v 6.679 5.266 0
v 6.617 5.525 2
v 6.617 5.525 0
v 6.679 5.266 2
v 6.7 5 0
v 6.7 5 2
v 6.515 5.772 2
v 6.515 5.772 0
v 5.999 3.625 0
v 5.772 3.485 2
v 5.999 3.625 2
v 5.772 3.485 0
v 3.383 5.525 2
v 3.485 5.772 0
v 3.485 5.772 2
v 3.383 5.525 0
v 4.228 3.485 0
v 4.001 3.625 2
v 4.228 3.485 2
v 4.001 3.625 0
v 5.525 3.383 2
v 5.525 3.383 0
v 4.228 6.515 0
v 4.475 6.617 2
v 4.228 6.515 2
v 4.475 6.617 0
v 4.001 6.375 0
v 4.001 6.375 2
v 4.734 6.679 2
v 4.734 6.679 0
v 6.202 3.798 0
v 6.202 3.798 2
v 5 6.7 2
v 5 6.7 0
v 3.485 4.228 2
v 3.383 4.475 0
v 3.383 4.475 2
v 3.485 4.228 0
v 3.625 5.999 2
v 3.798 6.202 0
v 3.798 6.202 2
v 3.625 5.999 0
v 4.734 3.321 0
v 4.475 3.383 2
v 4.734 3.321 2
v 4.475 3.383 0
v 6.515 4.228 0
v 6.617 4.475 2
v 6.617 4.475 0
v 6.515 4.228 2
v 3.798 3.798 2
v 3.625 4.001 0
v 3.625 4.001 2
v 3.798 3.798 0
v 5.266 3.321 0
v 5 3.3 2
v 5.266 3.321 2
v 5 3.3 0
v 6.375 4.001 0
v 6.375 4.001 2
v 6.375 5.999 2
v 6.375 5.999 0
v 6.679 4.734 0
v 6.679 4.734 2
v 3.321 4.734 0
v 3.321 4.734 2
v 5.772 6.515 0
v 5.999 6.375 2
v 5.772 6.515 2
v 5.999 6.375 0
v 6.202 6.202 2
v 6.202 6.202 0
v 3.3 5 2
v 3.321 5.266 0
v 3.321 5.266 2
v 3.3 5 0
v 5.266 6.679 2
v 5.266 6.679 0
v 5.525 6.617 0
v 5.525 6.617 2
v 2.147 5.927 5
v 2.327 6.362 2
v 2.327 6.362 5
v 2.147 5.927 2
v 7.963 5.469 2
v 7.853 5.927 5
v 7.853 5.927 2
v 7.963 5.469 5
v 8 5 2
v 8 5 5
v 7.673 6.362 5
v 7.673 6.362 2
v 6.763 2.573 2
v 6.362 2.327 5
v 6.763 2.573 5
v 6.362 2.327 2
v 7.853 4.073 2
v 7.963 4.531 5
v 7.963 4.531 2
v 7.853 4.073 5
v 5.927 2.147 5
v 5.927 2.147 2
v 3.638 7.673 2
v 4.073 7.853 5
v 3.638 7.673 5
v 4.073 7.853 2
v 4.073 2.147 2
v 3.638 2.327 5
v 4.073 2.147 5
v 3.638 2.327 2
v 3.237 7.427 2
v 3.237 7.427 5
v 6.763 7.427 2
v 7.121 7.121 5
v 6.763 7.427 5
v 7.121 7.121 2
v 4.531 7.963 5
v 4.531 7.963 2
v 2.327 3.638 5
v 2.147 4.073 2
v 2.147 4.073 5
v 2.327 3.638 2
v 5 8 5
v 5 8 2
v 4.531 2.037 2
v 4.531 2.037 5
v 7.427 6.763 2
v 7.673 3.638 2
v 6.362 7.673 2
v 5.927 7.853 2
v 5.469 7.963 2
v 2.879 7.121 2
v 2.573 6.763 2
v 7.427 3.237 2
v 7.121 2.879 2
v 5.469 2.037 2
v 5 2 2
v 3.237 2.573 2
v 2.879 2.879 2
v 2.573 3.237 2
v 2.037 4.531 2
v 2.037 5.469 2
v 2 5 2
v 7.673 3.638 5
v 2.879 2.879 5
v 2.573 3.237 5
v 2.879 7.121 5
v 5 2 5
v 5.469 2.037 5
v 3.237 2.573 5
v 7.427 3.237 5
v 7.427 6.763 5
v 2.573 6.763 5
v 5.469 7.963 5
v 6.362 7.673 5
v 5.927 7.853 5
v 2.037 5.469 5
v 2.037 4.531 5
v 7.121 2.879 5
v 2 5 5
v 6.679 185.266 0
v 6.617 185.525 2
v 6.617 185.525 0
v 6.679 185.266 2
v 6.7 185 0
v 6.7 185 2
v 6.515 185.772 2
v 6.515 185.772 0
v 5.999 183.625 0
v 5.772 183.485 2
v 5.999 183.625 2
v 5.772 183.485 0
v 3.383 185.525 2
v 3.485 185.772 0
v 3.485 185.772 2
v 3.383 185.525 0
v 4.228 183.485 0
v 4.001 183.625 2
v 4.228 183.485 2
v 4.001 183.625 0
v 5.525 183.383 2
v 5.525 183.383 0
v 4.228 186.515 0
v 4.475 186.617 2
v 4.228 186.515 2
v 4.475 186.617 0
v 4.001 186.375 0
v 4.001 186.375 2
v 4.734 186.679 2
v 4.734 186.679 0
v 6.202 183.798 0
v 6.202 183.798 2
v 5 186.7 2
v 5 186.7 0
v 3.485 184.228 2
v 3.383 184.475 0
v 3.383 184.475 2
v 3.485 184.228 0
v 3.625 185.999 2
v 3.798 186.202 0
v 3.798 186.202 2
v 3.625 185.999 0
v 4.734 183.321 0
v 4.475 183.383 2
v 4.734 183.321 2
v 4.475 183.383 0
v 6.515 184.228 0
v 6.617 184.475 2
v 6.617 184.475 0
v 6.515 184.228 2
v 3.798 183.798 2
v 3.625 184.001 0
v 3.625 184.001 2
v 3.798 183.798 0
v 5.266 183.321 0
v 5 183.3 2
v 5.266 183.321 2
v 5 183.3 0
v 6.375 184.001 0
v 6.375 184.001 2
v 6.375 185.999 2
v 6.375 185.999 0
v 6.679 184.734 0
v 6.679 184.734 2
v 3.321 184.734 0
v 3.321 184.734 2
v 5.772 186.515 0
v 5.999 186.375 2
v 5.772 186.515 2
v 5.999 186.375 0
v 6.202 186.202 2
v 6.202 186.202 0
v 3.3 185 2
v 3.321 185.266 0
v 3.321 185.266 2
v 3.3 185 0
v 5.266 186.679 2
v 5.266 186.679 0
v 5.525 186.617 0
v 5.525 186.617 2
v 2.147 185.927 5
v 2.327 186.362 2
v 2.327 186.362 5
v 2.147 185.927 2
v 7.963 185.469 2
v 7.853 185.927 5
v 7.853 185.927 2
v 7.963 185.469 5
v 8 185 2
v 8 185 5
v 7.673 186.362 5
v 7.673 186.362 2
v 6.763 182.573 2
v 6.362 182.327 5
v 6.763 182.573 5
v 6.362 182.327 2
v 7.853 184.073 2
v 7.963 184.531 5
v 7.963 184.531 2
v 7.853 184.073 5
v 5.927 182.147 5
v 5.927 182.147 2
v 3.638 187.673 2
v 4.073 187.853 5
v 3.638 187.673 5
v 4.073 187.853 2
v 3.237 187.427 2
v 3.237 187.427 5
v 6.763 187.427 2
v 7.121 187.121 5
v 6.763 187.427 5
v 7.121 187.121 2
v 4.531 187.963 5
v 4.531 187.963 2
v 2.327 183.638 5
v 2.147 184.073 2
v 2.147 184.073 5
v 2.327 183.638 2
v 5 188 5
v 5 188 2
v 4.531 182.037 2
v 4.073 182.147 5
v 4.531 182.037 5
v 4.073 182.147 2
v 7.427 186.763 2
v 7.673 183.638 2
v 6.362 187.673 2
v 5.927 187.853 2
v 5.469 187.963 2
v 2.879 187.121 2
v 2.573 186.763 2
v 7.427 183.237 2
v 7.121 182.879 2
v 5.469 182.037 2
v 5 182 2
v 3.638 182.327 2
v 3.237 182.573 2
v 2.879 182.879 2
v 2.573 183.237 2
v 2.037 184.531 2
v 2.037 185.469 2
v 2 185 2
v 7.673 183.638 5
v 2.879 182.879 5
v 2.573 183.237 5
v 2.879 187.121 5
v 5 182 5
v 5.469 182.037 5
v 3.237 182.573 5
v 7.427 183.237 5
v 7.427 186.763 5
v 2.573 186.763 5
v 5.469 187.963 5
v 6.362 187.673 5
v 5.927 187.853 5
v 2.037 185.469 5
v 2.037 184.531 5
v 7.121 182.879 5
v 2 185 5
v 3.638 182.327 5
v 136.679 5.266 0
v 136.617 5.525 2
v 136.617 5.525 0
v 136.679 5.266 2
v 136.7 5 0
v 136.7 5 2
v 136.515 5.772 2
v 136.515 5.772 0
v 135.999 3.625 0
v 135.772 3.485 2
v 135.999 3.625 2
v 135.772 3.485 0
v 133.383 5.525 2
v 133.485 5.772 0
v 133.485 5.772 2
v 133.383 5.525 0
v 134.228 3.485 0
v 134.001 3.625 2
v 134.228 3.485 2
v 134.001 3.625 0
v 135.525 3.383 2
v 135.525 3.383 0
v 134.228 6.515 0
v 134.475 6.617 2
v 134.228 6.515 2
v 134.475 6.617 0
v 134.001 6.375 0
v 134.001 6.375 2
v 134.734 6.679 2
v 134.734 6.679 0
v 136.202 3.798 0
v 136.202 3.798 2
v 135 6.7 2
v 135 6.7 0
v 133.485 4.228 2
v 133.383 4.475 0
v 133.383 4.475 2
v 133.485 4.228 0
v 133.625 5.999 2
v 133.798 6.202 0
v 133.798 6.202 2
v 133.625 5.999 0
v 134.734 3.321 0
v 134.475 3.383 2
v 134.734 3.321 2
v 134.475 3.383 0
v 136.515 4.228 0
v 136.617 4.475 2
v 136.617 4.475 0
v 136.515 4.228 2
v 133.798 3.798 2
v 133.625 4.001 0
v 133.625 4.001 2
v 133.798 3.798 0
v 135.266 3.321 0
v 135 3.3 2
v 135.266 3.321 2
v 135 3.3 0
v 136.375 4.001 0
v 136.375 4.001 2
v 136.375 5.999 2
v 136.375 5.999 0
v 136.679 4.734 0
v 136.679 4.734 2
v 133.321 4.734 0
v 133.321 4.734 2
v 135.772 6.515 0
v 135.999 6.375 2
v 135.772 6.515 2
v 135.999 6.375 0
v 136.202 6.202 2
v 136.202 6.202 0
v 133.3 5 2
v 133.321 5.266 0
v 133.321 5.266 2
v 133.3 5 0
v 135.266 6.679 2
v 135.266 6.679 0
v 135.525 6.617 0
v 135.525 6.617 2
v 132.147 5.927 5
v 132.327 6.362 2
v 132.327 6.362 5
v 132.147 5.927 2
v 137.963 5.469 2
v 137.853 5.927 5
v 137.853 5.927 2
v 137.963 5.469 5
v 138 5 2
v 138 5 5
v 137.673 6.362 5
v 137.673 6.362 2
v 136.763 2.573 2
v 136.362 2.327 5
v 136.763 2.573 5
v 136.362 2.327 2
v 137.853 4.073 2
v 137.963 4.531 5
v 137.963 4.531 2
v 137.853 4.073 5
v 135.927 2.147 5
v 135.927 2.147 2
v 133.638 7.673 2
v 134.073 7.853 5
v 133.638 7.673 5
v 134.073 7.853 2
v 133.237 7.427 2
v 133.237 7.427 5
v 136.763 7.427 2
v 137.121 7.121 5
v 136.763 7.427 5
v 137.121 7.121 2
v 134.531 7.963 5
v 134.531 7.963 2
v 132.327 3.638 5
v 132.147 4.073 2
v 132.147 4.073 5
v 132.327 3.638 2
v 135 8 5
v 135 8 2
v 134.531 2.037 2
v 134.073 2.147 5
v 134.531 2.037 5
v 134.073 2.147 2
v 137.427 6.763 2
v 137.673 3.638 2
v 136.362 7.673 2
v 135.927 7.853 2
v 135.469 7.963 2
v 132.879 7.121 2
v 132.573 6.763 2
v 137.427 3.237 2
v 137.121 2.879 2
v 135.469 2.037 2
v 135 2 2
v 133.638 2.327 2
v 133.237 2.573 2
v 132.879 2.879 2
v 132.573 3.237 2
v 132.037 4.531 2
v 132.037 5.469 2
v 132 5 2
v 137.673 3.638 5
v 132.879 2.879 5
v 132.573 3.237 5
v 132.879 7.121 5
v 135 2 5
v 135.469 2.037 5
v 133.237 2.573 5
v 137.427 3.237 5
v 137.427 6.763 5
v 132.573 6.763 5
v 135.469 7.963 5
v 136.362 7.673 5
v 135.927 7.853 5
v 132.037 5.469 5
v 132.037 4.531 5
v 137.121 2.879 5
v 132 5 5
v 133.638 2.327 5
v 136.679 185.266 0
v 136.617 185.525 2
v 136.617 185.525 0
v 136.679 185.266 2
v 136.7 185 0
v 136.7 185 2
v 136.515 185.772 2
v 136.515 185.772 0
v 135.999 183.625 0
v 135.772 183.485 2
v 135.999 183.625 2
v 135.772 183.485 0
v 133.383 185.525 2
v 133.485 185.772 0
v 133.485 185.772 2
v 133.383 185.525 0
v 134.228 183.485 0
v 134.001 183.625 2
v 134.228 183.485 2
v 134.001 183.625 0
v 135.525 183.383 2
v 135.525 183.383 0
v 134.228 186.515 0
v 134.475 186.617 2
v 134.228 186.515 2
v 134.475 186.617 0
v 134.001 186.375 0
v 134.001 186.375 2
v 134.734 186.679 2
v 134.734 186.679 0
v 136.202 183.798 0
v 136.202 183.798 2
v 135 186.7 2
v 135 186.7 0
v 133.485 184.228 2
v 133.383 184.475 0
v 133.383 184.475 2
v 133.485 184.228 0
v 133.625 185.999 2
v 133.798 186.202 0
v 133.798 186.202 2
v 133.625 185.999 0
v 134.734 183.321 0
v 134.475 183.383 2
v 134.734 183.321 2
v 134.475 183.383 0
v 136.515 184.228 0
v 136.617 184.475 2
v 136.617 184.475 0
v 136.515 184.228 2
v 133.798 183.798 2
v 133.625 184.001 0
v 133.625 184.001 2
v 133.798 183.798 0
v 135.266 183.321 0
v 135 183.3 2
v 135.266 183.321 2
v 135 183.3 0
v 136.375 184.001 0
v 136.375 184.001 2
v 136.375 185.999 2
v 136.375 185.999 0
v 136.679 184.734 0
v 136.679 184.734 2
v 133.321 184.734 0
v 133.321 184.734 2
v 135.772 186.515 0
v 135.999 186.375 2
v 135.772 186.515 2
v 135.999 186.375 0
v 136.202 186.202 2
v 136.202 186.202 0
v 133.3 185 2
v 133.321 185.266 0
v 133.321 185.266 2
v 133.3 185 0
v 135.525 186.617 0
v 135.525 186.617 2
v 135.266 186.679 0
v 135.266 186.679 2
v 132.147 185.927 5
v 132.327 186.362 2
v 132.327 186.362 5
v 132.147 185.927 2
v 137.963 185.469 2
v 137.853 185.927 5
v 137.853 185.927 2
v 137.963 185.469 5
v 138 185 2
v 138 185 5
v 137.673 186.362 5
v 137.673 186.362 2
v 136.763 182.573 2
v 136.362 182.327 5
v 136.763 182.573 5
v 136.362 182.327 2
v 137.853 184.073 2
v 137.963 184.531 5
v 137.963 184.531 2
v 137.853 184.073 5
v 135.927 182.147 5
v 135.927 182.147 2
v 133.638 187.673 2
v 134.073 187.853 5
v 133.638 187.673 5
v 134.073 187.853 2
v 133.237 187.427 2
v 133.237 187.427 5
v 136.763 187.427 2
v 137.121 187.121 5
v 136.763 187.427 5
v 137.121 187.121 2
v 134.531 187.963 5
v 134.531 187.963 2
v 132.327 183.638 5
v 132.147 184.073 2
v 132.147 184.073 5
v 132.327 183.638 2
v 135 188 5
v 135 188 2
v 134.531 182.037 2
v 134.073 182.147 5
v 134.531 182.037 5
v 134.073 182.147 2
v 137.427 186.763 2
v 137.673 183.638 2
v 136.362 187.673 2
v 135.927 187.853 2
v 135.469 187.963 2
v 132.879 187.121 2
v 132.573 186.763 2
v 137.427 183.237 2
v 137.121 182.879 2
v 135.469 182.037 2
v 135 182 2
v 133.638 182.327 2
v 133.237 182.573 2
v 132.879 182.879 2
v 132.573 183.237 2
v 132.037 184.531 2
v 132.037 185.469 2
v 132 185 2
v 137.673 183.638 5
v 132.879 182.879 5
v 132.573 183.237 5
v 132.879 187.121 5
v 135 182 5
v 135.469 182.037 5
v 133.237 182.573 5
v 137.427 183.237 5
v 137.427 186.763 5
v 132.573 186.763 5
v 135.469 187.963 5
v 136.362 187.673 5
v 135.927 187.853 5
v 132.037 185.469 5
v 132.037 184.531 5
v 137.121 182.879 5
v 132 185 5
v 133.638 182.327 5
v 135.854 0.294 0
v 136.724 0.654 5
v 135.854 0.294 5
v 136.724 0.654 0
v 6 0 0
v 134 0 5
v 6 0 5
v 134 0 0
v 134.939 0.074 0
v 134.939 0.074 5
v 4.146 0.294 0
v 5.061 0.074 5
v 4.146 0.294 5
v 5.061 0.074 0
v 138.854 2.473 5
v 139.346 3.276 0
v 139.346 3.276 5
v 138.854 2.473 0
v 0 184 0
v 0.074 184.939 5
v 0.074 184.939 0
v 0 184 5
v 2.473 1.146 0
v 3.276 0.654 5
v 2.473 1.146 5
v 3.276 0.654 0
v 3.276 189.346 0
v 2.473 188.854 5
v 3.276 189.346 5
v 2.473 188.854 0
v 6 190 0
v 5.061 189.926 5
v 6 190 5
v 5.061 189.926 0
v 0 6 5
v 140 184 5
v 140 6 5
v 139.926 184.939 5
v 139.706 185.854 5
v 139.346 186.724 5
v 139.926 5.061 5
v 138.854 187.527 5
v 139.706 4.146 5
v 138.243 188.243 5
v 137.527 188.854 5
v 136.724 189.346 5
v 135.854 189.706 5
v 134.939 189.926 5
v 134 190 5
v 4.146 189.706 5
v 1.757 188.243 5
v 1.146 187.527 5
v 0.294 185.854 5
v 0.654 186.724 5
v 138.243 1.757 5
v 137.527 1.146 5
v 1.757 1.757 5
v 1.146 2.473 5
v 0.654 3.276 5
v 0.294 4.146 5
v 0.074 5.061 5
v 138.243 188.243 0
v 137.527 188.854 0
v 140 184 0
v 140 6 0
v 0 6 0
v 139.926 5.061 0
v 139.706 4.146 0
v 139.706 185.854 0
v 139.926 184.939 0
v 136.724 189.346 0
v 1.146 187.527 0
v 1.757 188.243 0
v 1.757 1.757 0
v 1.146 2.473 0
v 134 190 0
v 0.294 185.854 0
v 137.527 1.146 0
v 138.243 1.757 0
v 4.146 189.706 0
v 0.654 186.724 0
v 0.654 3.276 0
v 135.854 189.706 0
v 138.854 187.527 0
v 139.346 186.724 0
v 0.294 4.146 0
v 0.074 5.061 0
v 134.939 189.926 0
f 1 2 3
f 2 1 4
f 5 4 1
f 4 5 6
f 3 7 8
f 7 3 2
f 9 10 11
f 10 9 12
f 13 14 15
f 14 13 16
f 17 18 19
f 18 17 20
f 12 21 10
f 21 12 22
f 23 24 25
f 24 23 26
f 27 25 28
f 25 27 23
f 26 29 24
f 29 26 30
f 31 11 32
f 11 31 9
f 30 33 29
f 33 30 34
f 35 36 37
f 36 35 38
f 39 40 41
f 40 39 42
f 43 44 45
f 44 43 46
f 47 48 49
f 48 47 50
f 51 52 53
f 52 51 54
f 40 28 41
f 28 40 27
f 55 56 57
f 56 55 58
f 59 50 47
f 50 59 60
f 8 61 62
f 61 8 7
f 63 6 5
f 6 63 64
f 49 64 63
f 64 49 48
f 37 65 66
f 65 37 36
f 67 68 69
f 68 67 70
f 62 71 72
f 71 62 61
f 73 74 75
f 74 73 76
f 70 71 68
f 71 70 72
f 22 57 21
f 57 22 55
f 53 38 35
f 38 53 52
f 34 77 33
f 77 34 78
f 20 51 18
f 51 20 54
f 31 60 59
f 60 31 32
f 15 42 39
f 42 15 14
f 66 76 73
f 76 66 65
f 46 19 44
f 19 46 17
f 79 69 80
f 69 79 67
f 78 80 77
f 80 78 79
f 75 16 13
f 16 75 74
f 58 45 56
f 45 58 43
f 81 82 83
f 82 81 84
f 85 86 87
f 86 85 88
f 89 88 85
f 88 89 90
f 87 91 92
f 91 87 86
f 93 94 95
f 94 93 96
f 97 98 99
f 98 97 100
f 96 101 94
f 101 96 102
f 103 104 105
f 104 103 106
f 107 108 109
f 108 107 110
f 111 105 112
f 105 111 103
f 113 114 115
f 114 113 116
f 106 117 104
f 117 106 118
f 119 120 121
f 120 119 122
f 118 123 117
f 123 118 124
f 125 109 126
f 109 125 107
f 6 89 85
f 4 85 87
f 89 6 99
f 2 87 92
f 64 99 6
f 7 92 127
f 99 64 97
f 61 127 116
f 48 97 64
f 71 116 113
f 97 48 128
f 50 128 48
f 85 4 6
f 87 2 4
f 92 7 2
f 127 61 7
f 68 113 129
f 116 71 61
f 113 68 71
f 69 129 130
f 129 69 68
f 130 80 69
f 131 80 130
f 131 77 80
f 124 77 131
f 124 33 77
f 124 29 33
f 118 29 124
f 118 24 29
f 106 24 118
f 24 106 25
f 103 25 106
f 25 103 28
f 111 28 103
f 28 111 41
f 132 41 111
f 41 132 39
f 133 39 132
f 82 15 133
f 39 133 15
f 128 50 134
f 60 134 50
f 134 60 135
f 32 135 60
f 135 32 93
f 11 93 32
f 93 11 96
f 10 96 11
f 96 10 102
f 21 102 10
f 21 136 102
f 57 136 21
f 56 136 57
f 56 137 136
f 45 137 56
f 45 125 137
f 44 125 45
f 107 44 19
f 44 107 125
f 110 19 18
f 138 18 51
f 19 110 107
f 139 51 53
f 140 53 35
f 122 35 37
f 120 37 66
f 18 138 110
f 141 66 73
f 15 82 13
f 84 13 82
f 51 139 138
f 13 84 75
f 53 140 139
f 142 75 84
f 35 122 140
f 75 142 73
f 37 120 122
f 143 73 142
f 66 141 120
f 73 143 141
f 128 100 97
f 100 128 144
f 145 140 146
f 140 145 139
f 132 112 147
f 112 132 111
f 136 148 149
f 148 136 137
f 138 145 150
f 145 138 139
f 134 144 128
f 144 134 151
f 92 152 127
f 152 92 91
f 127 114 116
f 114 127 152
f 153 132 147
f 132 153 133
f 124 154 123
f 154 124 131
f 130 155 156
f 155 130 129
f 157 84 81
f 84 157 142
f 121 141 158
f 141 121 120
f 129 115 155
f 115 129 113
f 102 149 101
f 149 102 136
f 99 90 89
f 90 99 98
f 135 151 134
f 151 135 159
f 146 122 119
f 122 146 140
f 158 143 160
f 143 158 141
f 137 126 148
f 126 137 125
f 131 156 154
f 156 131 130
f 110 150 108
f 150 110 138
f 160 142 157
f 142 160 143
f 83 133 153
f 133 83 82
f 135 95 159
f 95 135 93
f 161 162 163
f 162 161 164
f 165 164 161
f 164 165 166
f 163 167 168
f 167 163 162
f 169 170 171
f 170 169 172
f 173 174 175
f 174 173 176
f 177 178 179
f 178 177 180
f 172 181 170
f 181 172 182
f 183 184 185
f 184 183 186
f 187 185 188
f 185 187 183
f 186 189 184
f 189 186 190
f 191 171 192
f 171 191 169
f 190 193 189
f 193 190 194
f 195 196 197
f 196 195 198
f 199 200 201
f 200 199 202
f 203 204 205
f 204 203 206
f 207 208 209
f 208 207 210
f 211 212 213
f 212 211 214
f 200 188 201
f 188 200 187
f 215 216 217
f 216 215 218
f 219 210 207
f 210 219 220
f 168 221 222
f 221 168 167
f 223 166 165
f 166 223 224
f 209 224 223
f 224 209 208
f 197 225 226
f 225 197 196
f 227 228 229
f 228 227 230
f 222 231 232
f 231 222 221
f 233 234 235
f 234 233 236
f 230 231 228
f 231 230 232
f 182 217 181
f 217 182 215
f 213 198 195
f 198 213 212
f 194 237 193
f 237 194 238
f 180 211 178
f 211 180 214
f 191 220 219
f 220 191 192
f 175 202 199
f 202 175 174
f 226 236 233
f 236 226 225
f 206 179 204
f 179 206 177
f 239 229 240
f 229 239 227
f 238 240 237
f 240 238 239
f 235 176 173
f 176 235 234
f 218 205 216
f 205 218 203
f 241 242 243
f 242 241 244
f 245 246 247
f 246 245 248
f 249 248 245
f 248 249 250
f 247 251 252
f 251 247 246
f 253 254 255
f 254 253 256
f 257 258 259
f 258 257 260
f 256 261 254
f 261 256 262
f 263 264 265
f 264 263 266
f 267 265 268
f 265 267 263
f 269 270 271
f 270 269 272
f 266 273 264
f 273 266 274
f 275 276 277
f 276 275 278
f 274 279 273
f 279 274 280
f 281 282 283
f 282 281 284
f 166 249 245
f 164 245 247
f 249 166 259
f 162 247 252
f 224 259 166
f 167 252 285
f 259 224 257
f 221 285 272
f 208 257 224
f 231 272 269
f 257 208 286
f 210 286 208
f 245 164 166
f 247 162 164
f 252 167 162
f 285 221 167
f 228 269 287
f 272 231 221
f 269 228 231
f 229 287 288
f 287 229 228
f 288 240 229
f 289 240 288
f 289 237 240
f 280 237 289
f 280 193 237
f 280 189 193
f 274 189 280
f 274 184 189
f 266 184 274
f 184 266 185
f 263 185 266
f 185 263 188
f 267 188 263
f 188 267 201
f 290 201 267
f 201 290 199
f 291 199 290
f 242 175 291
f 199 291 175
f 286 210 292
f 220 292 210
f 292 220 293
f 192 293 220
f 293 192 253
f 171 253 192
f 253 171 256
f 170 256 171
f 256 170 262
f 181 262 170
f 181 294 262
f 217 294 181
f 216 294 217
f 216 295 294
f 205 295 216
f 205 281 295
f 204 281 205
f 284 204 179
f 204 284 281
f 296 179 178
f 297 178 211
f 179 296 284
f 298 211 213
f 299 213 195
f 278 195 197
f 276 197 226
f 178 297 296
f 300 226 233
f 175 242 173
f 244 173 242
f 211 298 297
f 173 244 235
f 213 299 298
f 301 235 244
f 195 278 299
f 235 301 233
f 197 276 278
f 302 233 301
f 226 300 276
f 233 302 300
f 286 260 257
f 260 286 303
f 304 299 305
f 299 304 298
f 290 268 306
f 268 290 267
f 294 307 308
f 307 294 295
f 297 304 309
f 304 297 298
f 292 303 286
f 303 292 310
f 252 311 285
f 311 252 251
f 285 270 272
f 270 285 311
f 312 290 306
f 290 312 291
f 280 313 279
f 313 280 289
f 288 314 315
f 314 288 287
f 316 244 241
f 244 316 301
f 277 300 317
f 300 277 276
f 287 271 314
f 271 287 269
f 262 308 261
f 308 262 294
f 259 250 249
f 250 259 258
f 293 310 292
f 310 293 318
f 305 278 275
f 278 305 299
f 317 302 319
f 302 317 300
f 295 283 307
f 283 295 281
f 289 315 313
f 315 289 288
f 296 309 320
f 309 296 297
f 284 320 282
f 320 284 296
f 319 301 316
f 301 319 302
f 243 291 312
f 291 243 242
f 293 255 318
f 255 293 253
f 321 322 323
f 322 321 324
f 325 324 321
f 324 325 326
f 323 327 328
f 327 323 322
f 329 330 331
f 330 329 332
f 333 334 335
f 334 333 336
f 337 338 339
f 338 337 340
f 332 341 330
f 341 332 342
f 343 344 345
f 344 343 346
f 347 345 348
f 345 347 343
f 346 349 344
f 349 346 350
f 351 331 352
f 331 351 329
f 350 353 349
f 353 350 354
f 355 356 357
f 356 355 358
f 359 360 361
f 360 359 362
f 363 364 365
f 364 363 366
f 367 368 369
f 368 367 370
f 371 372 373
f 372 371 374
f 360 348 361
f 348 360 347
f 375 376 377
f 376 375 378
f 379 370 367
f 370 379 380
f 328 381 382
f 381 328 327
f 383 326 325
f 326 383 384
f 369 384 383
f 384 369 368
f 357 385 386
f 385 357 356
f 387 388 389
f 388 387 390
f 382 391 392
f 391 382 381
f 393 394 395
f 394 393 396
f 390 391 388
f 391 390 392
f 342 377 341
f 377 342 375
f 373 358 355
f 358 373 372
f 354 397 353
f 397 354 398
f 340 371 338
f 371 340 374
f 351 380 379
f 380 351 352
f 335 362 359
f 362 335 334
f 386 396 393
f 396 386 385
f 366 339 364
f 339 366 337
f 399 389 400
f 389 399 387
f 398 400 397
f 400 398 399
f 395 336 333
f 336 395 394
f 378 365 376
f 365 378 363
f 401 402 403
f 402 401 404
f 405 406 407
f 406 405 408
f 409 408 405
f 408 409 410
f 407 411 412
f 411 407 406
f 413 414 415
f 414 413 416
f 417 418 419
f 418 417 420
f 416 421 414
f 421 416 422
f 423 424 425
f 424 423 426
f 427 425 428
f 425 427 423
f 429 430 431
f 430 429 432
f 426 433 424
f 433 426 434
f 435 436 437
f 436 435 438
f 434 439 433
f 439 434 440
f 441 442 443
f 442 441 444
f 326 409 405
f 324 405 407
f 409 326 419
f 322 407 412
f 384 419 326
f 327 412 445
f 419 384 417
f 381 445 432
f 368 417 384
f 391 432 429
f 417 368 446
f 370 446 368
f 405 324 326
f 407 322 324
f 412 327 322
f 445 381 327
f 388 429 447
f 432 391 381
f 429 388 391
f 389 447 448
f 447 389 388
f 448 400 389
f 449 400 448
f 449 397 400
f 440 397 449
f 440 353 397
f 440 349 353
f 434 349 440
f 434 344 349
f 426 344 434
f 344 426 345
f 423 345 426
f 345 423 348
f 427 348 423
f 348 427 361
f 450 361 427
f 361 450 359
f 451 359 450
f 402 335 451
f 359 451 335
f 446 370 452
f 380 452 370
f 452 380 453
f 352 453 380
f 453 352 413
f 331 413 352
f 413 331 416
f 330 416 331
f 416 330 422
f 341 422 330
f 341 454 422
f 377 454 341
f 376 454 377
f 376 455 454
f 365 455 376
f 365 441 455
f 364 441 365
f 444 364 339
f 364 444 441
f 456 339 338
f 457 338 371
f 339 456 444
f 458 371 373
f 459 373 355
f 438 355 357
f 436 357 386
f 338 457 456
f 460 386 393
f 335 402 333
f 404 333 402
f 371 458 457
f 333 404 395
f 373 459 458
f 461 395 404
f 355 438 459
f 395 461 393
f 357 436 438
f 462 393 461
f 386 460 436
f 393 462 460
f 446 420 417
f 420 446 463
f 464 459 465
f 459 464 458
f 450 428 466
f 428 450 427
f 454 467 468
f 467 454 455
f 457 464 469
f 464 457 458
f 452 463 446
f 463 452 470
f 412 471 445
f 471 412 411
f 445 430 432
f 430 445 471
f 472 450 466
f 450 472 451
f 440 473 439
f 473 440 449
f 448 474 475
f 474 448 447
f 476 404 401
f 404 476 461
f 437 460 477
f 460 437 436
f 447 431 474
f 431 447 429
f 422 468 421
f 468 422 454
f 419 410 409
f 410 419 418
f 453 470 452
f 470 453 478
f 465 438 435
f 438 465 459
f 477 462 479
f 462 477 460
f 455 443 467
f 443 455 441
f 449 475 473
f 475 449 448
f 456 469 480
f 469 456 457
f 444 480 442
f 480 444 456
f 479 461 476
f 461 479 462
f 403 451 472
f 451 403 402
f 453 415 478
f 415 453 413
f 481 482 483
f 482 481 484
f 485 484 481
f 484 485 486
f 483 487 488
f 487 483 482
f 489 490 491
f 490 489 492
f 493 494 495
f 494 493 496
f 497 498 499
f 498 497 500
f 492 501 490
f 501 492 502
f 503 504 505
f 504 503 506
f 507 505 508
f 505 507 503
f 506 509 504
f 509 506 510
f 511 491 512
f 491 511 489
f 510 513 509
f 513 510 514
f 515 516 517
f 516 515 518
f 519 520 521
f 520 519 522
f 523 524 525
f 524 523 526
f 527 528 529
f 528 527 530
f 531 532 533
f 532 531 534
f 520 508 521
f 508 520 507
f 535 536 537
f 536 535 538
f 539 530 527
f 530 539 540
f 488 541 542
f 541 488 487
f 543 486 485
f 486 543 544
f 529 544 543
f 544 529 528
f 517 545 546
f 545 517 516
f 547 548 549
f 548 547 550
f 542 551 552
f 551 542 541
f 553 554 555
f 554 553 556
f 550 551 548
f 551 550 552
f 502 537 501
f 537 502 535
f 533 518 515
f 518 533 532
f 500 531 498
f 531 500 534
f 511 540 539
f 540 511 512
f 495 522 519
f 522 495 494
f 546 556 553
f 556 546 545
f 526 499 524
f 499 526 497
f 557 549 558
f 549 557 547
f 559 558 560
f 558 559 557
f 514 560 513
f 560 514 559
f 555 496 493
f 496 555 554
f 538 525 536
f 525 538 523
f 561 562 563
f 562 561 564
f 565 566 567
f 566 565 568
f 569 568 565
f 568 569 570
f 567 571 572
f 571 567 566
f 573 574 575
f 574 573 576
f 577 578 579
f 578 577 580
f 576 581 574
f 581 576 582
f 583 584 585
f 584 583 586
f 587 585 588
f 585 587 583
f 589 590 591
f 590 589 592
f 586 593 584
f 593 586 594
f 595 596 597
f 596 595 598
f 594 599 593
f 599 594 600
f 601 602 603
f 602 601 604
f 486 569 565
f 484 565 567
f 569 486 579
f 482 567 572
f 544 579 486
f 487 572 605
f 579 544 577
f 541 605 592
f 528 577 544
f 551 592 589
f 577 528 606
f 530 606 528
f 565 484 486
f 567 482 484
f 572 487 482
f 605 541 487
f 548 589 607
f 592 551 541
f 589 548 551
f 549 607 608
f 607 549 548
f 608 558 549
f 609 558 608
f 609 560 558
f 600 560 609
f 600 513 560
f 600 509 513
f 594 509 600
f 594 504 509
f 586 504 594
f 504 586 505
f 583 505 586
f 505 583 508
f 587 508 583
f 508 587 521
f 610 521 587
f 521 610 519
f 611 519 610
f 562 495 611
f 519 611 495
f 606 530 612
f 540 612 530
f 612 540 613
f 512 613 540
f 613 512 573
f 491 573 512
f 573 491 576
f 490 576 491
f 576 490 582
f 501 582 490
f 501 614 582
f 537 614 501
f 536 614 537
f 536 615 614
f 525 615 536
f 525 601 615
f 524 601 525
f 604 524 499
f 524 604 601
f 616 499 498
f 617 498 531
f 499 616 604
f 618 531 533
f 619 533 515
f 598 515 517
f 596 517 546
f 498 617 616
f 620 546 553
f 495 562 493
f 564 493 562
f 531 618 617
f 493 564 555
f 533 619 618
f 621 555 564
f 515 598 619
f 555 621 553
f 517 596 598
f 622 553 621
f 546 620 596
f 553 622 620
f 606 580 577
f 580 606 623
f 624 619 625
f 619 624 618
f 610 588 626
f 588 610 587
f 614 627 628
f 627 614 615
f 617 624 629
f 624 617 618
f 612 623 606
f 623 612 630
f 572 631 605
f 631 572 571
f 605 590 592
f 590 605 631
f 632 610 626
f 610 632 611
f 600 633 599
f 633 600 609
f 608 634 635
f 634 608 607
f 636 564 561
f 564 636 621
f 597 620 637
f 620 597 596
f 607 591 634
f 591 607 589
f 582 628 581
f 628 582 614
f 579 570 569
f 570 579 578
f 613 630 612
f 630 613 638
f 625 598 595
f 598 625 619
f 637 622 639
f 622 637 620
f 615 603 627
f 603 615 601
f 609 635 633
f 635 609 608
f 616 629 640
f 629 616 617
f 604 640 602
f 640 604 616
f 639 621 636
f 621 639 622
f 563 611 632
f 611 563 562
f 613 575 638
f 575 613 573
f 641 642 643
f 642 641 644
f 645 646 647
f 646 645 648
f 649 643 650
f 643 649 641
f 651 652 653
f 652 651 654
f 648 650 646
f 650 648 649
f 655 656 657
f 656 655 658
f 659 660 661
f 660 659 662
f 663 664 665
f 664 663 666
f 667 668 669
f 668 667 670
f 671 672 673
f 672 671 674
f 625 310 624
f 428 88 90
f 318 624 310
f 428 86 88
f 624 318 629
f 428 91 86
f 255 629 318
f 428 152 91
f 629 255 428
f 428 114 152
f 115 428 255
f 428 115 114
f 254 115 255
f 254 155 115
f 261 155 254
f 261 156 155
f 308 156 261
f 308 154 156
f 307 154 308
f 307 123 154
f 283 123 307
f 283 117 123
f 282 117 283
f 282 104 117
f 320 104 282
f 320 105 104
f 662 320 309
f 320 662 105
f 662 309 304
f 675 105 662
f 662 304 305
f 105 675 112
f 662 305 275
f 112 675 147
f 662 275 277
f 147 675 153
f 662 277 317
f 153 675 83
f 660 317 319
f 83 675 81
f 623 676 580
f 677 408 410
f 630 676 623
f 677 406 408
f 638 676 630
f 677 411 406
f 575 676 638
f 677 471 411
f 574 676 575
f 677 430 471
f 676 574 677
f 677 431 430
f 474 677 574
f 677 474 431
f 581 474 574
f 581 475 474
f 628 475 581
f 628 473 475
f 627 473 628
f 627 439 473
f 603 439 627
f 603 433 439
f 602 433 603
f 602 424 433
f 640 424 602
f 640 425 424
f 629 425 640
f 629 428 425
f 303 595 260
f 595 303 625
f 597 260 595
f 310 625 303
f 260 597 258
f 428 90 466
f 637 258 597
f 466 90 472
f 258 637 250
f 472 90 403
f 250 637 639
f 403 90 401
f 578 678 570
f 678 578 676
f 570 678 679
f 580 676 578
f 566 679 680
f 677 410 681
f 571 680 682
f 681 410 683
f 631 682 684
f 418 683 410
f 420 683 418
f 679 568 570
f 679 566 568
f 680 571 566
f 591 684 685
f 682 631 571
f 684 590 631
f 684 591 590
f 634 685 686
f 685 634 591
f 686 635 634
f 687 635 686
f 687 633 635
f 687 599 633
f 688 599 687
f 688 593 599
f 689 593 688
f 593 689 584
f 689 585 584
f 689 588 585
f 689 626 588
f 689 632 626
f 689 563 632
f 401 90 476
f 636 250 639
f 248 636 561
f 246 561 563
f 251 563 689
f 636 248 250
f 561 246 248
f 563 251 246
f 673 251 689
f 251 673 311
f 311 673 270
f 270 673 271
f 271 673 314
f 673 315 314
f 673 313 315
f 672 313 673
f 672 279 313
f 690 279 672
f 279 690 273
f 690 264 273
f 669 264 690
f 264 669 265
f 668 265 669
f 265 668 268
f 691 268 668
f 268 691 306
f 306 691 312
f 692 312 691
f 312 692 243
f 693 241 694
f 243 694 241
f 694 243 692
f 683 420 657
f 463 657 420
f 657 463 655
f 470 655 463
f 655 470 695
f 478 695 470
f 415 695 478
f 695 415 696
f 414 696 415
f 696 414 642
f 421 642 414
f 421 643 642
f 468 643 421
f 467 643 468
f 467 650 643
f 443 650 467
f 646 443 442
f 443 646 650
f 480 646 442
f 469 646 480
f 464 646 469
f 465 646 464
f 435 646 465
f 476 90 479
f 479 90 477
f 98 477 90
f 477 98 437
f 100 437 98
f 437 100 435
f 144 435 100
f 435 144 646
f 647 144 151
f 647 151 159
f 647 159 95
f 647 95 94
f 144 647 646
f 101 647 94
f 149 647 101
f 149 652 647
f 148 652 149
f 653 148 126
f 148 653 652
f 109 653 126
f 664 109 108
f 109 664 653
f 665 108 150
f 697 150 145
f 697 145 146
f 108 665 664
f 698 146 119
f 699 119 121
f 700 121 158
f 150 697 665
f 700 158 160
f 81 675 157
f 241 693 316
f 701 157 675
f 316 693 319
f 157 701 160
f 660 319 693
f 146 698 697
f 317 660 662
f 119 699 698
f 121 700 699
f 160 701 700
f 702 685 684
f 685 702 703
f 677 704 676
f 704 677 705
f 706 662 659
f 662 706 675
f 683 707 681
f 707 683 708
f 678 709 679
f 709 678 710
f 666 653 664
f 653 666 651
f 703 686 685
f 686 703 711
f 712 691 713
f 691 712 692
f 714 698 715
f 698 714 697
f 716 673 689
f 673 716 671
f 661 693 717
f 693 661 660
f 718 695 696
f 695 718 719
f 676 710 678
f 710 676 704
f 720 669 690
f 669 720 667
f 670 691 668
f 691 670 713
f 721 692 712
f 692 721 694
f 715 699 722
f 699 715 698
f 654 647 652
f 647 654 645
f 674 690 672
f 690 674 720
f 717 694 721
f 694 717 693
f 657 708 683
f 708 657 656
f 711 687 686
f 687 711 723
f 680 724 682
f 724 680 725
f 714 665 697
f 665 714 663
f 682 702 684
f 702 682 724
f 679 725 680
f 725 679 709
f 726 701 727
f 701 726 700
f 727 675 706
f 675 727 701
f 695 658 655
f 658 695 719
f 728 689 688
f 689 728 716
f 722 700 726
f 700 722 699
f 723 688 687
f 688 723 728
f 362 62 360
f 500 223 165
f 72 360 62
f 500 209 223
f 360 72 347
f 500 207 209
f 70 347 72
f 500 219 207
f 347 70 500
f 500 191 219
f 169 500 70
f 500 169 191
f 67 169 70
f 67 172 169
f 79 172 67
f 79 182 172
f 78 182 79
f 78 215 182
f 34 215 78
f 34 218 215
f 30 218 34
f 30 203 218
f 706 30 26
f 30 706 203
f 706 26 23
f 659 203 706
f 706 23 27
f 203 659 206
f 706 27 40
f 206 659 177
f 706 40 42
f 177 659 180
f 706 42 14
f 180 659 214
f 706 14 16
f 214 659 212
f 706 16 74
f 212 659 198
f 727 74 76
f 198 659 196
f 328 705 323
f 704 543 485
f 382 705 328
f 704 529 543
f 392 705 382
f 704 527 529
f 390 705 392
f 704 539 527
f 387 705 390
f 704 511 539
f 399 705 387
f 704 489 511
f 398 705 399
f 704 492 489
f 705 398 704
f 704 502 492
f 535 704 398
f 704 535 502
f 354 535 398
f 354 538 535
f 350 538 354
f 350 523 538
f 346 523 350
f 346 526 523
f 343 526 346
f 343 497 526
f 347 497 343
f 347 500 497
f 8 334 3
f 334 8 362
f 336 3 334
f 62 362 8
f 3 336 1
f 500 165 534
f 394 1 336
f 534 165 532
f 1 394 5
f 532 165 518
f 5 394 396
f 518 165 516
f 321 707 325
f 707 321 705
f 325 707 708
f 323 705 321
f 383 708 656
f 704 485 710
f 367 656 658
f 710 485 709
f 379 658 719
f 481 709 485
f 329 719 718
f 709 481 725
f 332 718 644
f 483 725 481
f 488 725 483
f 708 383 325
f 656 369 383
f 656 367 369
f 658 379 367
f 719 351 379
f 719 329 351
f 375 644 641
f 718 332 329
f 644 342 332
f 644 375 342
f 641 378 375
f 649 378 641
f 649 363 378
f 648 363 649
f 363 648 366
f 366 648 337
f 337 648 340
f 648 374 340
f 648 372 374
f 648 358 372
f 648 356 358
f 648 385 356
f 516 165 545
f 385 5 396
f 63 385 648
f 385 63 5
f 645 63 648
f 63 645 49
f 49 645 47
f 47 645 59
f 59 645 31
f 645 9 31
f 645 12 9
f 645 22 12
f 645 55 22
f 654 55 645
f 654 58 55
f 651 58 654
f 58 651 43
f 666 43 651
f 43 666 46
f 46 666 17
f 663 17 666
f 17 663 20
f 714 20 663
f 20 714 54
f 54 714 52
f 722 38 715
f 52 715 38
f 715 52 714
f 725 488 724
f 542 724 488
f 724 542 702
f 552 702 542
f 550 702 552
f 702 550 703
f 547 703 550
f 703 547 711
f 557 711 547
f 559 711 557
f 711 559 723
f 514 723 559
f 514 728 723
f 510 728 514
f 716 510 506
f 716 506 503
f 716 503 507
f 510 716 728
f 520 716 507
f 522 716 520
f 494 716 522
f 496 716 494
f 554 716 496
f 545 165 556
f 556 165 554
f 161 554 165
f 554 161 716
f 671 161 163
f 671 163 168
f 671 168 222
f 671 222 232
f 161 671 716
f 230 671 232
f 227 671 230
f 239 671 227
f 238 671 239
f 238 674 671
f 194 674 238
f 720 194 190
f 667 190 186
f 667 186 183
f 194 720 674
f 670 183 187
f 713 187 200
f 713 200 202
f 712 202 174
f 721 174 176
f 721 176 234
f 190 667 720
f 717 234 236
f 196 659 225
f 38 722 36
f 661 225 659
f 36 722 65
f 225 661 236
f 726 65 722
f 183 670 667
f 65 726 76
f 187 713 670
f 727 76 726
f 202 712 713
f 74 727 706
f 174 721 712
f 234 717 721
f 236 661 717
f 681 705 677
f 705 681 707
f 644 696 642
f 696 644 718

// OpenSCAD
include <../lib/pouch-comms-module-lib.scad>;
$fn = 40;
lid();
